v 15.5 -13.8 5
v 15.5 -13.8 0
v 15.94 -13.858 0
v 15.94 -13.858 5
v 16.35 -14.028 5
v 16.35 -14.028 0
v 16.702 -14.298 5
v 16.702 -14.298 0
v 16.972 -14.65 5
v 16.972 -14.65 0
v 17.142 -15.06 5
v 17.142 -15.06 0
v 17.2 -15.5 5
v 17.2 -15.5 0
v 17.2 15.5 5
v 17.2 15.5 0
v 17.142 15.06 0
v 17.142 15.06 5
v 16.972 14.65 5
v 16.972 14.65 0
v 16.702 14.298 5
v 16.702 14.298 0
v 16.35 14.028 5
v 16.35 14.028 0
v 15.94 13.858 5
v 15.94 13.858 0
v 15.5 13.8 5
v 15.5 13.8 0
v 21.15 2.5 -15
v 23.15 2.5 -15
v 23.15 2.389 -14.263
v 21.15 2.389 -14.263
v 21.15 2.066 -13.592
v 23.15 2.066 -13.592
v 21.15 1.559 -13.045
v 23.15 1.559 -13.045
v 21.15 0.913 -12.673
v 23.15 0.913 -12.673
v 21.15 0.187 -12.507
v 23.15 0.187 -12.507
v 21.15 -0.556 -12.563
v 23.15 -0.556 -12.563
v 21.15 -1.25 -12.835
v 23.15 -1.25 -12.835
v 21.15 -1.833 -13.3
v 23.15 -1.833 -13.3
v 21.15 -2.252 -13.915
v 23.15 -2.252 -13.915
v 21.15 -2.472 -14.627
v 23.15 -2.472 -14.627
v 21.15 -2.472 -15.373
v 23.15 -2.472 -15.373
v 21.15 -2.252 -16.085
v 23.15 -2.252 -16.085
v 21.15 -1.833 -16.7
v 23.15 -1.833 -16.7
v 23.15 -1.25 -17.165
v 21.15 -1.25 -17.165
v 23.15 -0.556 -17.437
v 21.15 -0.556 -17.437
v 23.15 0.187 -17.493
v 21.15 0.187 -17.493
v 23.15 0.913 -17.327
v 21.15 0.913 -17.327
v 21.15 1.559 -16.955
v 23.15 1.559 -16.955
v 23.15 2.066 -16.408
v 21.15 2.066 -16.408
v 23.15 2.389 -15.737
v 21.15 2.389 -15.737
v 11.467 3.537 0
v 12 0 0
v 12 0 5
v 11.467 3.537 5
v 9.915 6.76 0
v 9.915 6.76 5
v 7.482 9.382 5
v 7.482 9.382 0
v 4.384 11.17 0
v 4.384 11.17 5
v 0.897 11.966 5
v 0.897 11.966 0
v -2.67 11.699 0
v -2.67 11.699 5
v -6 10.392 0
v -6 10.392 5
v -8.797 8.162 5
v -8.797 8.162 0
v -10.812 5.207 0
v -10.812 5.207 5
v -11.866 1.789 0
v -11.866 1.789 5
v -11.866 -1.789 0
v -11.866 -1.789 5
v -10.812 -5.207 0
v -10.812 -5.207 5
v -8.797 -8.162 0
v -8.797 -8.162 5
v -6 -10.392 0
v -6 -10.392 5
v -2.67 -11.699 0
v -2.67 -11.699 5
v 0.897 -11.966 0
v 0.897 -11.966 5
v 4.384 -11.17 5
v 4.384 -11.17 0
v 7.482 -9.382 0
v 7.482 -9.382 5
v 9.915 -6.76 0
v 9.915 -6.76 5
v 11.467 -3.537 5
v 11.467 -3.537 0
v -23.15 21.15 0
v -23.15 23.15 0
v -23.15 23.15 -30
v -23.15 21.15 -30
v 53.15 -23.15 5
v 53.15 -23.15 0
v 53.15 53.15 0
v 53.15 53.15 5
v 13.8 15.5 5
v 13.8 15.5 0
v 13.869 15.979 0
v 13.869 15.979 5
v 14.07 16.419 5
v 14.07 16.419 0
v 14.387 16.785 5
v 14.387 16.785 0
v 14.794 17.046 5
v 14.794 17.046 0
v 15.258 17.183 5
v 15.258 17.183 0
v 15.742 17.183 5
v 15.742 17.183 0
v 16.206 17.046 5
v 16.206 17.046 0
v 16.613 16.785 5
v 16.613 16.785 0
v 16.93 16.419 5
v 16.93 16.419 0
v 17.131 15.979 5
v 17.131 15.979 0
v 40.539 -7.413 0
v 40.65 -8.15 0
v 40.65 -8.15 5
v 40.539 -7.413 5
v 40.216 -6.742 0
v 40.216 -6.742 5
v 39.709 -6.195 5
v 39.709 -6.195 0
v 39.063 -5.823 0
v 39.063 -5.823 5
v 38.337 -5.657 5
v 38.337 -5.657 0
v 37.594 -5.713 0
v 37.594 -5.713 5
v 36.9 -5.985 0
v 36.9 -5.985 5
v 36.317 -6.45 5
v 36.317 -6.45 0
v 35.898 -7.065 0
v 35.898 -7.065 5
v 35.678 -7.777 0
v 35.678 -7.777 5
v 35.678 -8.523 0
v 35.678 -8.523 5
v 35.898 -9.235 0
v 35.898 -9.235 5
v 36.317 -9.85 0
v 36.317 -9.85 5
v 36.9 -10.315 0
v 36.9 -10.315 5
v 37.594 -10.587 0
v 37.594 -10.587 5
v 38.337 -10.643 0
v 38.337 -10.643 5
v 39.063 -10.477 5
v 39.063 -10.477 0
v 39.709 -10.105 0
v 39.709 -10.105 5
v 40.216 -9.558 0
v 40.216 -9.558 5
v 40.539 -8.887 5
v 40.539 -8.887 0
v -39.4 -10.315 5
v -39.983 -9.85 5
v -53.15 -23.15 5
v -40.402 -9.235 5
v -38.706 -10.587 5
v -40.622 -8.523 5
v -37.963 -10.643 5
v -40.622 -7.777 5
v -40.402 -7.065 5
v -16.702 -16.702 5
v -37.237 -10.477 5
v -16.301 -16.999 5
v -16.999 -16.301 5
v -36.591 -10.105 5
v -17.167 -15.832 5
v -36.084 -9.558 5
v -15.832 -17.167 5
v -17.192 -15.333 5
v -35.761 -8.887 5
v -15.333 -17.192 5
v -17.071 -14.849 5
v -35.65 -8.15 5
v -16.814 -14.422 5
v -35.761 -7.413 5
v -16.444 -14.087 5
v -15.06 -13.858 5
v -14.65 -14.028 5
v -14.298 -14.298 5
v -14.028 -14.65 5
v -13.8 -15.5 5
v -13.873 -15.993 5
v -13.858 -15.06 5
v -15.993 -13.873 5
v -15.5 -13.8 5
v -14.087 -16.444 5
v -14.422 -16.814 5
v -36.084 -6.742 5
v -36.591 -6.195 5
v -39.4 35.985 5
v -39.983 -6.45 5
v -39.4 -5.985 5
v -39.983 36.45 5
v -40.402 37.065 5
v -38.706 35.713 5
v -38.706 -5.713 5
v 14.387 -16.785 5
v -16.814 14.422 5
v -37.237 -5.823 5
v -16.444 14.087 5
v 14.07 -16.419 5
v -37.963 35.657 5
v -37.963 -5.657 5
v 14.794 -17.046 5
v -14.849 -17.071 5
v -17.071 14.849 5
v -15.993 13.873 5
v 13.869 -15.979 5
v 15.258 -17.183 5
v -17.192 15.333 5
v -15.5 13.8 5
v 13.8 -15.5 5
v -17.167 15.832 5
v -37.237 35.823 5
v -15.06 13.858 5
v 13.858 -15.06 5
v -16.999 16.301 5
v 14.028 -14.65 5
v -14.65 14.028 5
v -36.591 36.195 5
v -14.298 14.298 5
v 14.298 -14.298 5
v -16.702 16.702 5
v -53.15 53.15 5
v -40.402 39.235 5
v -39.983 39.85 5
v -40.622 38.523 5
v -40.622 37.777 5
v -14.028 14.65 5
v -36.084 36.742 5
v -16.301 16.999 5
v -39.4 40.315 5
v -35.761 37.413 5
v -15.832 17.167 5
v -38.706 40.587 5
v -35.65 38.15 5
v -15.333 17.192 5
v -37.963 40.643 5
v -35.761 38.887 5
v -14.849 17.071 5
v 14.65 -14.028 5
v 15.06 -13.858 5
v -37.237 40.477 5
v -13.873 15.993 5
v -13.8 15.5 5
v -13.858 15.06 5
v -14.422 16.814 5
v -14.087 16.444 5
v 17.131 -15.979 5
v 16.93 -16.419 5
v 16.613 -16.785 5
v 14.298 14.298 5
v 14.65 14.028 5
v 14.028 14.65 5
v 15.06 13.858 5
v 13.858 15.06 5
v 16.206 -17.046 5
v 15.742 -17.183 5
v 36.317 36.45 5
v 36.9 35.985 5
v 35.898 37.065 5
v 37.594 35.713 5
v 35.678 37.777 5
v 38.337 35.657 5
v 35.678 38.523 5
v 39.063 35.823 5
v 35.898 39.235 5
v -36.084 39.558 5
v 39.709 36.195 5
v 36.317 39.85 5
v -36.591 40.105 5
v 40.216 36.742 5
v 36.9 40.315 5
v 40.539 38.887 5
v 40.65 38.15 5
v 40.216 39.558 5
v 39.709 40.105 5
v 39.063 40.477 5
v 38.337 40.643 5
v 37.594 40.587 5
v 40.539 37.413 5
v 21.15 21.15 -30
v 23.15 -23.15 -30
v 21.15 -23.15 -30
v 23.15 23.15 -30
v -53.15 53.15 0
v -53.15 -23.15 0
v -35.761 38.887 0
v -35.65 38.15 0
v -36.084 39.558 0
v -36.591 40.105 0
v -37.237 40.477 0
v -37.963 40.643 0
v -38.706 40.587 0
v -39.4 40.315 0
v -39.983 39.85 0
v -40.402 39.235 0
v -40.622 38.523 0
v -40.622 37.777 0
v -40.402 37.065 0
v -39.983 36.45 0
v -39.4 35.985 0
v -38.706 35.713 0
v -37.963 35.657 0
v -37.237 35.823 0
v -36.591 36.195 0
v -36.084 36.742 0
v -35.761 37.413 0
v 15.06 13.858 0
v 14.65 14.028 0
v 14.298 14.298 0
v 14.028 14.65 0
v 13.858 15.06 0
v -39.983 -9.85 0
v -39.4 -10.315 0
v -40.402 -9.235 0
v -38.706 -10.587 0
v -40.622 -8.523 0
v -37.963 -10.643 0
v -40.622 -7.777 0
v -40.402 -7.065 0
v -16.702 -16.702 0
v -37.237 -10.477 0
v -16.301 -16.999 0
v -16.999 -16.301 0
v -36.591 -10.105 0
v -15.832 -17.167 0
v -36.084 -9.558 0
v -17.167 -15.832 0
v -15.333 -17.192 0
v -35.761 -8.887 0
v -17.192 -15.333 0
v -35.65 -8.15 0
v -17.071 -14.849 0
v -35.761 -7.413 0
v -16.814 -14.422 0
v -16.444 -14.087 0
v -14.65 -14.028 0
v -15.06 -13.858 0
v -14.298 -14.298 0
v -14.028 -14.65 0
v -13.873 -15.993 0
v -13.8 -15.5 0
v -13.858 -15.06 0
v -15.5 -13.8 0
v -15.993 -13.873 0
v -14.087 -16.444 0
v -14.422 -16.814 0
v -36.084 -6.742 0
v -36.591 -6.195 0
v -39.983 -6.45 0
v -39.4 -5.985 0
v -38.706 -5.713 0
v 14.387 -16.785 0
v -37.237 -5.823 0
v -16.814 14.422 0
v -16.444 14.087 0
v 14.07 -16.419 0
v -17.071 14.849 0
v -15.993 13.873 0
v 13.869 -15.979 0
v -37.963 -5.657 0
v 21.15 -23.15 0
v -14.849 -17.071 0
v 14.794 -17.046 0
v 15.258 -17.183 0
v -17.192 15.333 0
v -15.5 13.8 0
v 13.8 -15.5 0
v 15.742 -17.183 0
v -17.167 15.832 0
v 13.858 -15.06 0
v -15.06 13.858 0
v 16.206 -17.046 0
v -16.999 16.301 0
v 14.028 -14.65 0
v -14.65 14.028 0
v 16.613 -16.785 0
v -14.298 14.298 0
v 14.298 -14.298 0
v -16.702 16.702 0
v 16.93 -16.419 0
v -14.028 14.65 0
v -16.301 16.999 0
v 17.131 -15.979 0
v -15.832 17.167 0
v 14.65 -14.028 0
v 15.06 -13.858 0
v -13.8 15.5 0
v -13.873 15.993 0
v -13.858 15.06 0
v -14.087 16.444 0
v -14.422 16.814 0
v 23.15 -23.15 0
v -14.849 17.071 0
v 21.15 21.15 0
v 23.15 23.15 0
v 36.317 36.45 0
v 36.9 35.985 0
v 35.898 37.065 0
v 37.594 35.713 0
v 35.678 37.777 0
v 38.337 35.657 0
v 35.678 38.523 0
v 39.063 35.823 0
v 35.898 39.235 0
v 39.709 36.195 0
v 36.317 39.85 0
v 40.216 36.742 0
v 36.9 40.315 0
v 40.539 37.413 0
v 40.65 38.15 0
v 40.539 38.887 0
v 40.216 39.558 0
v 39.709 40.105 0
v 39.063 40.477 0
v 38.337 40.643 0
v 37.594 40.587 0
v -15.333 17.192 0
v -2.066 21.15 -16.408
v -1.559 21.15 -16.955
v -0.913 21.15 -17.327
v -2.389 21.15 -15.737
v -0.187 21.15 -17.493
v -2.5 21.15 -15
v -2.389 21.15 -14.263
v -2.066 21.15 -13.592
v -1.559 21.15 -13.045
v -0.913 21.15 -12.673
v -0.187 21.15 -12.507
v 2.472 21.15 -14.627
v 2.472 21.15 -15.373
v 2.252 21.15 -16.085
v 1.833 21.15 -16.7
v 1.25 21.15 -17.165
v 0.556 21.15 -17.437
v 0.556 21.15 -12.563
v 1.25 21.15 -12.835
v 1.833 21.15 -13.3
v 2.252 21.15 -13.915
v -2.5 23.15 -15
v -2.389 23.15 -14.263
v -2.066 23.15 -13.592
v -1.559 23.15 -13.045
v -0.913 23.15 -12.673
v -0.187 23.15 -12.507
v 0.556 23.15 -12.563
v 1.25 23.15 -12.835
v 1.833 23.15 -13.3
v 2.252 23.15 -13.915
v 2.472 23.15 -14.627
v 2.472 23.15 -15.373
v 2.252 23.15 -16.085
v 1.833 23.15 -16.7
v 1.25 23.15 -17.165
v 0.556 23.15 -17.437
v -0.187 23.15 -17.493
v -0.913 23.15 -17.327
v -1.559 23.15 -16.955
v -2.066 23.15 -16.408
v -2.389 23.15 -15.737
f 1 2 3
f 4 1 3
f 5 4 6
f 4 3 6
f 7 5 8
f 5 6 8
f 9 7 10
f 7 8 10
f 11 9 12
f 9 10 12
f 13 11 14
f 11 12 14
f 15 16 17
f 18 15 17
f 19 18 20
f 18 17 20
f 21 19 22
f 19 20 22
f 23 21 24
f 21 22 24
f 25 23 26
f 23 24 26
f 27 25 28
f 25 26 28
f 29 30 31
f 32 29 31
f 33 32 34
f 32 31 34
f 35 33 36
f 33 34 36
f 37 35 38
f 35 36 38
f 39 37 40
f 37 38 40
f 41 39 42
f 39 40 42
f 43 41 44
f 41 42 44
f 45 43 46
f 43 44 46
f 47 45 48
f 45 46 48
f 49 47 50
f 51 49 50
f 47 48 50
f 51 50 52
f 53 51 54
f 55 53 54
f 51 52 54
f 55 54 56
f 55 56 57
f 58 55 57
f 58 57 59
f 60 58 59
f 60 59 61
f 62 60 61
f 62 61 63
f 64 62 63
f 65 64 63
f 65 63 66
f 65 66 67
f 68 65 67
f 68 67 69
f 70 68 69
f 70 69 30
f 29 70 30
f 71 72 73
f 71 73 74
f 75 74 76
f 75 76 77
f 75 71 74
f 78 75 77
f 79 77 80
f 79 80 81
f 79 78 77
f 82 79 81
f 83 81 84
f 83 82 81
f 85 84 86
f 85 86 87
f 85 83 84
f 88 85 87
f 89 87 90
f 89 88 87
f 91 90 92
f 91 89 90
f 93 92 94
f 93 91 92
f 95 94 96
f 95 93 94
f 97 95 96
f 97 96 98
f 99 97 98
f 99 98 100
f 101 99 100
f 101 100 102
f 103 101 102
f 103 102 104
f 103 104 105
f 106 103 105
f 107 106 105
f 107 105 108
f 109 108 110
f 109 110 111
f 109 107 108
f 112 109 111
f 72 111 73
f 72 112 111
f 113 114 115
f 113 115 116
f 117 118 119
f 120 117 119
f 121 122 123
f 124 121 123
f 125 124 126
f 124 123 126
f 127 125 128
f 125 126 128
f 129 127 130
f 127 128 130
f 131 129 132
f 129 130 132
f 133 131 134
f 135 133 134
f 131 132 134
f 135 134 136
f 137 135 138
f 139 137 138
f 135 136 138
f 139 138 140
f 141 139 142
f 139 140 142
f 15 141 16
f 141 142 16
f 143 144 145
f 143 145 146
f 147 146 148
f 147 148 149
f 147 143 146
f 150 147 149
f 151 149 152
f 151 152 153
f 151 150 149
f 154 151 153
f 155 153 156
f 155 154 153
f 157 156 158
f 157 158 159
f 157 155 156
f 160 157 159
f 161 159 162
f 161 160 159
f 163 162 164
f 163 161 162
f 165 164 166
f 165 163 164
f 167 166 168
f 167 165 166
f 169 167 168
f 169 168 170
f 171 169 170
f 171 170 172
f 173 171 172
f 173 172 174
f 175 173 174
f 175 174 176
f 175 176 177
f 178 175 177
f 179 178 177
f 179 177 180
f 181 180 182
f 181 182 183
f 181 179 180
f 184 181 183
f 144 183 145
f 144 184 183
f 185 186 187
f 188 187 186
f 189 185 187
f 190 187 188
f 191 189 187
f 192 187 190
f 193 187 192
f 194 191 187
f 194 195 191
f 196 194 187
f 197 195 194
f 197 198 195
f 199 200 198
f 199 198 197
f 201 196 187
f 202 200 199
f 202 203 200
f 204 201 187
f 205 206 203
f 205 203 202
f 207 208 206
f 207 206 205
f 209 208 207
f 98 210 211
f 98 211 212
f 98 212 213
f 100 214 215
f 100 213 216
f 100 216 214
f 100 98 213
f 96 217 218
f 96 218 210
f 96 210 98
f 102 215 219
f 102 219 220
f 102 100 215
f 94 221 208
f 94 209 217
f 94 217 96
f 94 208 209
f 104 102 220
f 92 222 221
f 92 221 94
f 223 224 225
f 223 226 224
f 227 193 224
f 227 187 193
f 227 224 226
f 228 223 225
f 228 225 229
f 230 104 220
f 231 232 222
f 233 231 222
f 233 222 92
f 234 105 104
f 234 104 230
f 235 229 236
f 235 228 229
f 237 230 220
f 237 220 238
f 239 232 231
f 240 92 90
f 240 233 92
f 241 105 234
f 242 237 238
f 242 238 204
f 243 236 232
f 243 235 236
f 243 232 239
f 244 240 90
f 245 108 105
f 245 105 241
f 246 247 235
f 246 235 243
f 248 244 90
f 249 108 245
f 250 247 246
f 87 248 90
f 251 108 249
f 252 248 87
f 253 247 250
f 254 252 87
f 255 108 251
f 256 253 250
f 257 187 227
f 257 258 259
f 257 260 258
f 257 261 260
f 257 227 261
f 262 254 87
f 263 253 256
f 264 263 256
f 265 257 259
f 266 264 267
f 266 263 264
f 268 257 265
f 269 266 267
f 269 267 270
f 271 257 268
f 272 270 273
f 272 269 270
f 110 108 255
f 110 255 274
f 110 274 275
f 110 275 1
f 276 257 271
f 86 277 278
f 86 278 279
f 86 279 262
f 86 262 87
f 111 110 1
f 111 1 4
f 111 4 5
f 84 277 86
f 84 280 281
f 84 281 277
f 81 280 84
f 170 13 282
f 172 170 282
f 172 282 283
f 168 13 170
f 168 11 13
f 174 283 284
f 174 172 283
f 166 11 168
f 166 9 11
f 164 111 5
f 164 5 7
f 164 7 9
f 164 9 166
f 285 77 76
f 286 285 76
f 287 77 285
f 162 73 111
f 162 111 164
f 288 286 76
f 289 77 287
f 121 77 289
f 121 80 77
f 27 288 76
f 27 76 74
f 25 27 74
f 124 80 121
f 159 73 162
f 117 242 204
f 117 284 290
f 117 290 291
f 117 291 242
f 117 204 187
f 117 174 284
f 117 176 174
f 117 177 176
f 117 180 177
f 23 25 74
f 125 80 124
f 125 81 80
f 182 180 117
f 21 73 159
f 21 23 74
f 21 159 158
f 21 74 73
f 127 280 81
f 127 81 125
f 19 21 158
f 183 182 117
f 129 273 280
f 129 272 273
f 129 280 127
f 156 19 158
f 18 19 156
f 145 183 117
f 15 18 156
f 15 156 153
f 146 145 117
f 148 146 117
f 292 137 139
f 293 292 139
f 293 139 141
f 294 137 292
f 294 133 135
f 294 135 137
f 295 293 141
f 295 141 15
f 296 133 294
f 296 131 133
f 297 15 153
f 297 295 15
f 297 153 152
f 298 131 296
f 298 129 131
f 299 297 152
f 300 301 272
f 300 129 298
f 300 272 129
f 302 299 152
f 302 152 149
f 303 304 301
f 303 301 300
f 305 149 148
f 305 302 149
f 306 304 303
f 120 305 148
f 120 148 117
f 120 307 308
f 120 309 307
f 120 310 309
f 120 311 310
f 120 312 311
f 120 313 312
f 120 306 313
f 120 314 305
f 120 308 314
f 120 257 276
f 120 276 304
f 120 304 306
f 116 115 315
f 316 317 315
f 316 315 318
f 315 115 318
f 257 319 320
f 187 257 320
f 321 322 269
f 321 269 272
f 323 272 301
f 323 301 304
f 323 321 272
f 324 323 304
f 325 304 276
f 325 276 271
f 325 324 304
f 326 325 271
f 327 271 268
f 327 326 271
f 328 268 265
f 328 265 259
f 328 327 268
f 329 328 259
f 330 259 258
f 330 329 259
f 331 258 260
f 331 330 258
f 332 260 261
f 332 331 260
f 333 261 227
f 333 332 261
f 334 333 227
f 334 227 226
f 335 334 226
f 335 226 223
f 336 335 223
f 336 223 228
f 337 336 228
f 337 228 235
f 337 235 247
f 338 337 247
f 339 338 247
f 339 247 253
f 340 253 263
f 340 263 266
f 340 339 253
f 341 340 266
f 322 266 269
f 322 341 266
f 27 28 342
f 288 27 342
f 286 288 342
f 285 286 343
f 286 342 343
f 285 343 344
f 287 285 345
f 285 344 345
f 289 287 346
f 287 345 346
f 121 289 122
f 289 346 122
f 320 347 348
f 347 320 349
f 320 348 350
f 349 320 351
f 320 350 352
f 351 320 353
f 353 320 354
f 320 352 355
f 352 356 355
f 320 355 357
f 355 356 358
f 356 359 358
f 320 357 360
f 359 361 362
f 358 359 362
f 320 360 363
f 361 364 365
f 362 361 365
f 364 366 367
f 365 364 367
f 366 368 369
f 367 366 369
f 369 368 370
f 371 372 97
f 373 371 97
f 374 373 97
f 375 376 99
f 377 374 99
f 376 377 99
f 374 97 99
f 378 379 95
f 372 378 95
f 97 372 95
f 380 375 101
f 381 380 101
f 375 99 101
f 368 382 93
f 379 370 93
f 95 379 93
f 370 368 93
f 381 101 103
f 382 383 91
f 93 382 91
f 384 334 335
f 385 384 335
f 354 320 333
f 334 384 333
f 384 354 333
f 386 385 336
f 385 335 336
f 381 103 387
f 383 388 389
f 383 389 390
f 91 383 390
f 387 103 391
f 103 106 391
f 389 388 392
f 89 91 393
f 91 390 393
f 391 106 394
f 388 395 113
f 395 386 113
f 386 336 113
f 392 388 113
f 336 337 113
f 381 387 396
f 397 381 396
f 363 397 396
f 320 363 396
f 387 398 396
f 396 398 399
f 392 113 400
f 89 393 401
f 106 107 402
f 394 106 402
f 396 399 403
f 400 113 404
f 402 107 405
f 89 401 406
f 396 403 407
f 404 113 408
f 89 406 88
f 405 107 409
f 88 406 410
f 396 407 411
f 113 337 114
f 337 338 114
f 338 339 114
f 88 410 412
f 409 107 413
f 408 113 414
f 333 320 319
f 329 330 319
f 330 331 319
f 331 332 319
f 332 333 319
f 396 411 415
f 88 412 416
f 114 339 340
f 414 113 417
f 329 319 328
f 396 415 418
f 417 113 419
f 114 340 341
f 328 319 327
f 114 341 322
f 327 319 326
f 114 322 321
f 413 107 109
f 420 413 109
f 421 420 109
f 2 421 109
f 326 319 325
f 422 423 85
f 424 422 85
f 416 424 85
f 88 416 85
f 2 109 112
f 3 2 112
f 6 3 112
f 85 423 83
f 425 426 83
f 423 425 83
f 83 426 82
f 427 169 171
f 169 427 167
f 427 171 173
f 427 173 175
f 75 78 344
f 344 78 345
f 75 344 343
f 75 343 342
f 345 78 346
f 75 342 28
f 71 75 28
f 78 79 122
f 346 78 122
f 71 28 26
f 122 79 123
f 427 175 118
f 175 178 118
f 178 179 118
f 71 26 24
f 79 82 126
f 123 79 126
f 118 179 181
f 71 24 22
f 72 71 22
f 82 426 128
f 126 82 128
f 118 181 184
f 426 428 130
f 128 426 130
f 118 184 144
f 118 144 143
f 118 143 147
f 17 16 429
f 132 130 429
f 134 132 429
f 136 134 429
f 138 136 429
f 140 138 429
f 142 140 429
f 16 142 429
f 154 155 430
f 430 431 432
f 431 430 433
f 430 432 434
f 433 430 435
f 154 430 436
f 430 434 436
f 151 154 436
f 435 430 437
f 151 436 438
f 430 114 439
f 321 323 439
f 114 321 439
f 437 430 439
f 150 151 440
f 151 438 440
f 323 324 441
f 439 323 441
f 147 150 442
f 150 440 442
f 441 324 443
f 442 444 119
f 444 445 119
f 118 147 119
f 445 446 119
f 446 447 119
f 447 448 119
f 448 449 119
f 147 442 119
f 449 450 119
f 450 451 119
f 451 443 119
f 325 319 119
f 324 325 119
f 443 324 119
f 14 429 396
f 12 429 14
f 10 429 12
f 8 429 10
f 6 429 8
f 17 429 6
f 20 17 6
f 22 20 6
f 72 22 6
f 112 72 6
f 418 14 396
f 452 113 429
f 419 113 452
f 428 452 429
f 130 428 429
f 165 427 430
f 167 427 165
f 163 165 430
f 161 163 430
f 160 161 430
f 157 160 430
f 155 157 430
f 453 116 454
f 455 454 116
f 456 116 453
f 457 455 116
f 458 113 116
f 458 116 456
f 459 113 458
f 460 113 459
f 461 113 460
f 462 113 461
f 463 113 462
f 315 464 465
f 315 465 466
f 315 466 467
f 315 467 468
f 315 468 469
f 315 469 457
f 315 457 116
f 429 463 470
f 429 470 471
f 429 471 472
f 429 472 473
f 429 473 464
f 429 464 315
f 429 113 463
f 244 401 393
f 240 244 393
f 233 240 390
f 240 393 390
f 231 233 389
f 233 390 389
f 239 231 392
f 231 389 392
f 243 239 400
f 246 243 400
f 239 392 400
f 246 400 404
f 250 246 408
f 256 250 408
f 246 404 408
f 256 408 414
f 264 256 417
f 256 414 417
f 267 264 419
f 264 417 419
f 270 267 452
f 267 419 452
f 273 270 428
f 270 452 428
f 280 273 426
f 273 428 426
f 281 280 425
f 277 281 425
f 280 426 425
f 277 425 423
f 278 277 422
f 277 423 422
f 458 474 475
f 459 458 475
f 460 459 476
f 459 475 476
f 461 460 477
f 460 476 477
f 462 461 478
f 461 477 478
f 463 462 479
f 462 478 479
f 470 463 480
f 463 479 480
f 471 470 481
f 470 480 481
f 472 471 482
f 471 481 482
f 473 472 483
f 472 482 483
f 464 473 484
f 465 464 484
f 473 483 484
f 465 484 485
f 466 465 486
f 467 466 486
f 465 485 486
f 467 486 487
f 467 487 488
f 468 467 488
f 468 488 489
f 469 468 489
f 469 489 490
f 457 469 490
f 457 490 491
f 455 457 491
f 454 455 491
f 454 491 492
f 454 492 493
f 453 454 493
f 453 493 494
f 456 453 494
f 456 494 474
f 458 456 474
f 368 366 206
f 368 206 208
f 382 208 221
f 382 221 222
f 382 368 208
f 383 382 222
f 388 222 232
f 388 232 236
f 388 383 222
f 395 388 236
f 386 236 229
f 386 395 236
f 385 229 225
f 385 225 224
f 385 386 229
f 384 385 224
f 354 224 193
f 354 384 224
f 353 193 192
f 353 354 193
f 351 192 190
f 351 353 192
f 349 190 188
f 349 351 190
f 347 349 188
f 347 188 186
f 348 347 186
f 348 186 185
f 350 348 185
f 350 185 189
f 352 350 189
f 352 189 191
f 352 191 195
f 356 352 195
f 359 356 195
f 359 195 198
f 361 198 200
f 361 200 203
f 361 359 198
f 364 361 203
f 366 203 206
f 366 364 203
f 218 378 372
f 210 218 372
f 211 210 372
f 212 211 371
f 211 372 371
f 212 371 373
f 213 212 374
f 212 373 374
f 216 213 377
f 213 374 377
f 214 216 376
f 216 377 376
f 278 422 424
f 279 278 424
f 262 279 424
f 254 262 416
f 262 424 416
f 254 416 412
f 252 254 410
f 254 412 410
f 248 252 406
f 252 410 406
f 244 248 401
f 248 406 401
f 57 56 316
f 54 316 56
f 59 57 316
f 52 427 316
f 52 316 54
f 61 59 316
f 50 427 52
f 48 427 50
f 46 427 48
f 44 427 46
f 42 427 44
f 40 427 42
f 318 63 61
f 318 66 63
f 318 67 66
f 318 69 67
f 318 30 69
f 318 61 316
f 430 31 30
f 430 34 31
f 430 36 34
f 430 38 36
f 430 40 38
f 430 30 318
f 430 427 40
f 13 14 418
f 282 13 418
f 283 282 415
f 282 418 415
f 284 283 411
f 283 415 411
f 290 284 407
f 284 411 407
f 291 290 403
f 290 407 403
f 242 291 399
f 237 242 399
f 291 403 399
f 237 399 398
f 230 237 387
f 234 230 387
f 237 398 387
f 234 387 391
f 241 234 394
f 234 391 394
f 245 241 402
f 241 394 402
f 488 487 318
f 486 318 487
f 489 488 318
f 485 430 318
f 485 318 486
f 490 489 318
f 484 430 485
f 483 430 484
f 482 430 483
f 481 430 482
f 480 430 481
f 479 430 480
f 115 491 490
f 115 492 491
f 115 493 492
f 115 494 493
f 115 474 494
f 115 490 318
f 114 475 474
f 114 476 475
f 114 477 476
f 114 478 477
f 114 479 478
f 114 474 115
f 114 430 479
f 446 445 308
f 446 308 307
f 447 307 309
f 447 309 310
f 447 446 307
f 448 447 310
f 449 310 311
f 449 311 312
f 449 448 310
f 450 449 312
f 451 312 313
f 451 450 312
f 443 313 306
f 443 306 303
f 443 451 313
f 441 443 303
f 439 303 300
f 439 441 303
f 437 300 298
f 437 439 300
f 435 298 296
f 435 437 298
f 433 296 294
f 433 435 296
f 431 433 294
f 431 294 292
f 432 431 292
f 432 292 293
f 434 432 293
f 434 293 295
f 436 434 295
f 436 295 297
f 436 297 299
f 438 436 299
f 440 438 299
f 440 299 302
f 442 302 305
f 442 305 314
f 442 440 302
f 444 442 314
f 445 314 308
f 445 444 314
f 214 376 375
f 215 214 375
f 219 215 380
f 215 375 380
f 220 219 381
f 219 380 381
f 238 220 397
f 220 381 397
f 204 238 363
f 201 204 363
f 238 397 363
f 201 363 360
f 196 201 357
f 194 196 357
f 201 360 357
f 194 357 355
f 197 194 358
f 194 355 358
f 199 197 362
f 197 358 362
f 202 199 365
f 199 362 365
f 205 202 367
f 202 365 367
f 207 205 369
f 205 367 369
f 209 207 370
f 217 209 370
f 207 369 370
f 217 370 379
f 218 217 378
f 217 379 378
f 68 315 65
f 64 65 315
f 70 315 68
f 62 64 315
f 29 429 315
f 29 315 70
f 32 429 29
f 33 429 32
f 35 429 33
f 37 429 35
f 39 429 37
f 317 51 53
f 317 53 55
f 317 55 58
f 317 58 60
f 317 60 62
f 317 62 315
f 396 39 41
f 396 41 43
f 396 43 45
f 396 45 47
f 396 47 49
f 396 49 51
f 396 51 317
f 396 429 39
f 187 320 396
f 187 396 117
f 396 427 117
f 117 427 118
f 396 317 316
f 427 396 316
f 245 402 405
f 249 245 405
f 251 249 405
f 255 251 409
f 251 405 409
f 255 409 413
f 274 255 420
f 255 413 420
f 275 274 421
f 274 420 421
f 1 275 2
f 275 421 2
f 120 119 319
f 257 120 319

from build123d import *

# Parameters (mm, degrees)
F0_W           = 42.3
F0_H           = 42.3
F0_R           = 12
F0_R_2         = 2.5
F0_H_2         = 2
F1_DEPTH       = 5
F2_DEPTH       = 30
F5_D           = 5
F5_DEPTH       = 12.7
F5_TIP         = 1.5021515476
F5_ON_F4_D     = 5
F5_ON_F4_DEPTH = 12.7
F5_ON_F4_TIP   = 1.5021515476


with BuildPart() as f1:
    # F0 (on Top) → F1 (new body)
    with BuildSketch(Plane.XY):
        Polygon((-21.15, 21.15), (21.15, 21.15), (23.15, 21.15), (23.15, 23.15), (-23.15, 23.15), (-23.15, 21.15), align=None)
        Rectangle(F0_W, F0_H)
        with BuildLine():
            ThreePointArc((-15.5, 13.8), (-16.702081528, 16.702081528), (-13.8, 15.5))
            Line((-13.8, 15.5), (13.8, 15.5))
            ThreePointArc((13.8, 15.5), (15.5, 17.2), (17.2, 15.5))
            ThreePointArc((17.2, 15.5), (16.702081528, 14.297918472), (15.5, 13.8))
            Line((15.5, 13.8), (15.5, -13.8))
            ThreePointArc((15.5, -13.8), (16.702081528, -14.297918472), (17.2, -15.5))
            ThreePointArc((17.2, -15.5), (15.5, -17.2), (13.8, -15.5))
            Line((13.8, -15.5), (-13.8, -15.5))
            ThreePointArc((-13.8, -15.5), (-16.702081528, -16.702081528), (-15.5, -13.8))
            Line((-15.5, -13.8), (-15.5, 13.8))
        make_face(mode=Mode.SUBTRACT)
        with BuildLine():
            Line((13.8, 15.5), (-13.8, 15.5))
            ThreePointArc((-13.8, 15.5), (-14.297918472, 14.297918472), (-15.5, 13.8))
            Line((-15.5, 13.8), (-15.5, -13.8))
            ThreePointArc((-15.5, -13.8), (-14.297918472, -14.297918472), (-13.8, -15.5))
            Line((-13.8, -15.5), (13.8, -15.5))
            ThreePointArc((13.8, -15.5), (14.297918472, -14.297918472), (15.5, -13.8))
            Line((15.5, -13.8), (15.5, 13.8))
            ThreePointArc((15.5, 13.8), (14.297918472, 14.297918472), (13.8, 15.5))
        make_face()
        Circle(F0_R, mode=Mode.SUBTRACT)
        Polygon((23.15, 23.15), (23.15, 21.15), (23.15, -23.15), (53.15, -23.15), (53.15, 53.15), (-53.15, 53.15), (-53.15, -23.15), (-23.15, -23.15), (-23.15, 21.15), (-23.15, 23.15), align=None)
        with Locations((-38.15, -8.15)):
            Circle(F0_R_2, mode=Mode.SUBTRACT)
        with Locations((38.15, -8.15)):
            Circle(F0_R_2, mode=Mode.SUBTRACT)
        with Locations((-38.15, 38.15)):
            Circle(F0_R_2, mode=Mode.SUBTRACT)
        with Locations((38.15, 38.15)):
            Circle(F0_R_2, mode=Mode.SUBTRACT)
        Polygon((-21.15, -21.15), (-21.15, 21.15), (-23.15, 21.15), (-23.15, -23.15), (-21.15, -23.15), align=None)
        Polygon((23.15, 21.15), (21.15, 21.15), (21.15, -21.15), (21.15, -23.15), (23.15, -23.15), align=None)
        with Locations((0, -22.15)):
            Rectangle(F0_W, F0_H_2)
    extrude(amount=F1_DEPTH)

    # F0 (on Top) → F2 (join)
    with BuildSketch(Plane.XY):
        Polygon((-21.15, 21.15), (21.15, 21.15), (23.15, 21.15), (23.15, 23.15), (-23.15, 23.15), (-23.15, 21.15), align=None)
        Polygon((23.15, 21.15), (21.15, 21.15), (21.15, -21.15), (21.15, -23.15), (23.15, -23.15), align=None)
    extrude(amount=-F2_DEPTH)

    # F5
    with Locations(Plane.XZ.offset(-21.15)):
        with Locations((0, -15)):
            Hole(F5_D / 2, depth=F5_DEPTH)
            with Locations((0, 0, -(F5_DEPTH + F5_TIP / 2))):  # 118° drill point
                Cone(0, F5_D / 2, F5_TIP, mode=Mode.SUBTRACT)

    # F5 on F4
    with Locations(Plane(origin=(21.15, 0, 0), x_dir=(0, -1, 0), z_dir=(-1, 0, 0))):
        with Locations((0, -15)):
            Hole(F5_ON_F4_D / 2, depth=F5_ON_F4_DEPTH)
            with Locations((0, 0, -(F5_ON_F4_DEPTH + F5_ON_F4_TIP / 2))):  # 118° drill point
                Cone(0, F5_ON_F4_D / 2, F5_ON_F4_TIP, mode=Mode.SUBTRACT)


solid = f1.part
